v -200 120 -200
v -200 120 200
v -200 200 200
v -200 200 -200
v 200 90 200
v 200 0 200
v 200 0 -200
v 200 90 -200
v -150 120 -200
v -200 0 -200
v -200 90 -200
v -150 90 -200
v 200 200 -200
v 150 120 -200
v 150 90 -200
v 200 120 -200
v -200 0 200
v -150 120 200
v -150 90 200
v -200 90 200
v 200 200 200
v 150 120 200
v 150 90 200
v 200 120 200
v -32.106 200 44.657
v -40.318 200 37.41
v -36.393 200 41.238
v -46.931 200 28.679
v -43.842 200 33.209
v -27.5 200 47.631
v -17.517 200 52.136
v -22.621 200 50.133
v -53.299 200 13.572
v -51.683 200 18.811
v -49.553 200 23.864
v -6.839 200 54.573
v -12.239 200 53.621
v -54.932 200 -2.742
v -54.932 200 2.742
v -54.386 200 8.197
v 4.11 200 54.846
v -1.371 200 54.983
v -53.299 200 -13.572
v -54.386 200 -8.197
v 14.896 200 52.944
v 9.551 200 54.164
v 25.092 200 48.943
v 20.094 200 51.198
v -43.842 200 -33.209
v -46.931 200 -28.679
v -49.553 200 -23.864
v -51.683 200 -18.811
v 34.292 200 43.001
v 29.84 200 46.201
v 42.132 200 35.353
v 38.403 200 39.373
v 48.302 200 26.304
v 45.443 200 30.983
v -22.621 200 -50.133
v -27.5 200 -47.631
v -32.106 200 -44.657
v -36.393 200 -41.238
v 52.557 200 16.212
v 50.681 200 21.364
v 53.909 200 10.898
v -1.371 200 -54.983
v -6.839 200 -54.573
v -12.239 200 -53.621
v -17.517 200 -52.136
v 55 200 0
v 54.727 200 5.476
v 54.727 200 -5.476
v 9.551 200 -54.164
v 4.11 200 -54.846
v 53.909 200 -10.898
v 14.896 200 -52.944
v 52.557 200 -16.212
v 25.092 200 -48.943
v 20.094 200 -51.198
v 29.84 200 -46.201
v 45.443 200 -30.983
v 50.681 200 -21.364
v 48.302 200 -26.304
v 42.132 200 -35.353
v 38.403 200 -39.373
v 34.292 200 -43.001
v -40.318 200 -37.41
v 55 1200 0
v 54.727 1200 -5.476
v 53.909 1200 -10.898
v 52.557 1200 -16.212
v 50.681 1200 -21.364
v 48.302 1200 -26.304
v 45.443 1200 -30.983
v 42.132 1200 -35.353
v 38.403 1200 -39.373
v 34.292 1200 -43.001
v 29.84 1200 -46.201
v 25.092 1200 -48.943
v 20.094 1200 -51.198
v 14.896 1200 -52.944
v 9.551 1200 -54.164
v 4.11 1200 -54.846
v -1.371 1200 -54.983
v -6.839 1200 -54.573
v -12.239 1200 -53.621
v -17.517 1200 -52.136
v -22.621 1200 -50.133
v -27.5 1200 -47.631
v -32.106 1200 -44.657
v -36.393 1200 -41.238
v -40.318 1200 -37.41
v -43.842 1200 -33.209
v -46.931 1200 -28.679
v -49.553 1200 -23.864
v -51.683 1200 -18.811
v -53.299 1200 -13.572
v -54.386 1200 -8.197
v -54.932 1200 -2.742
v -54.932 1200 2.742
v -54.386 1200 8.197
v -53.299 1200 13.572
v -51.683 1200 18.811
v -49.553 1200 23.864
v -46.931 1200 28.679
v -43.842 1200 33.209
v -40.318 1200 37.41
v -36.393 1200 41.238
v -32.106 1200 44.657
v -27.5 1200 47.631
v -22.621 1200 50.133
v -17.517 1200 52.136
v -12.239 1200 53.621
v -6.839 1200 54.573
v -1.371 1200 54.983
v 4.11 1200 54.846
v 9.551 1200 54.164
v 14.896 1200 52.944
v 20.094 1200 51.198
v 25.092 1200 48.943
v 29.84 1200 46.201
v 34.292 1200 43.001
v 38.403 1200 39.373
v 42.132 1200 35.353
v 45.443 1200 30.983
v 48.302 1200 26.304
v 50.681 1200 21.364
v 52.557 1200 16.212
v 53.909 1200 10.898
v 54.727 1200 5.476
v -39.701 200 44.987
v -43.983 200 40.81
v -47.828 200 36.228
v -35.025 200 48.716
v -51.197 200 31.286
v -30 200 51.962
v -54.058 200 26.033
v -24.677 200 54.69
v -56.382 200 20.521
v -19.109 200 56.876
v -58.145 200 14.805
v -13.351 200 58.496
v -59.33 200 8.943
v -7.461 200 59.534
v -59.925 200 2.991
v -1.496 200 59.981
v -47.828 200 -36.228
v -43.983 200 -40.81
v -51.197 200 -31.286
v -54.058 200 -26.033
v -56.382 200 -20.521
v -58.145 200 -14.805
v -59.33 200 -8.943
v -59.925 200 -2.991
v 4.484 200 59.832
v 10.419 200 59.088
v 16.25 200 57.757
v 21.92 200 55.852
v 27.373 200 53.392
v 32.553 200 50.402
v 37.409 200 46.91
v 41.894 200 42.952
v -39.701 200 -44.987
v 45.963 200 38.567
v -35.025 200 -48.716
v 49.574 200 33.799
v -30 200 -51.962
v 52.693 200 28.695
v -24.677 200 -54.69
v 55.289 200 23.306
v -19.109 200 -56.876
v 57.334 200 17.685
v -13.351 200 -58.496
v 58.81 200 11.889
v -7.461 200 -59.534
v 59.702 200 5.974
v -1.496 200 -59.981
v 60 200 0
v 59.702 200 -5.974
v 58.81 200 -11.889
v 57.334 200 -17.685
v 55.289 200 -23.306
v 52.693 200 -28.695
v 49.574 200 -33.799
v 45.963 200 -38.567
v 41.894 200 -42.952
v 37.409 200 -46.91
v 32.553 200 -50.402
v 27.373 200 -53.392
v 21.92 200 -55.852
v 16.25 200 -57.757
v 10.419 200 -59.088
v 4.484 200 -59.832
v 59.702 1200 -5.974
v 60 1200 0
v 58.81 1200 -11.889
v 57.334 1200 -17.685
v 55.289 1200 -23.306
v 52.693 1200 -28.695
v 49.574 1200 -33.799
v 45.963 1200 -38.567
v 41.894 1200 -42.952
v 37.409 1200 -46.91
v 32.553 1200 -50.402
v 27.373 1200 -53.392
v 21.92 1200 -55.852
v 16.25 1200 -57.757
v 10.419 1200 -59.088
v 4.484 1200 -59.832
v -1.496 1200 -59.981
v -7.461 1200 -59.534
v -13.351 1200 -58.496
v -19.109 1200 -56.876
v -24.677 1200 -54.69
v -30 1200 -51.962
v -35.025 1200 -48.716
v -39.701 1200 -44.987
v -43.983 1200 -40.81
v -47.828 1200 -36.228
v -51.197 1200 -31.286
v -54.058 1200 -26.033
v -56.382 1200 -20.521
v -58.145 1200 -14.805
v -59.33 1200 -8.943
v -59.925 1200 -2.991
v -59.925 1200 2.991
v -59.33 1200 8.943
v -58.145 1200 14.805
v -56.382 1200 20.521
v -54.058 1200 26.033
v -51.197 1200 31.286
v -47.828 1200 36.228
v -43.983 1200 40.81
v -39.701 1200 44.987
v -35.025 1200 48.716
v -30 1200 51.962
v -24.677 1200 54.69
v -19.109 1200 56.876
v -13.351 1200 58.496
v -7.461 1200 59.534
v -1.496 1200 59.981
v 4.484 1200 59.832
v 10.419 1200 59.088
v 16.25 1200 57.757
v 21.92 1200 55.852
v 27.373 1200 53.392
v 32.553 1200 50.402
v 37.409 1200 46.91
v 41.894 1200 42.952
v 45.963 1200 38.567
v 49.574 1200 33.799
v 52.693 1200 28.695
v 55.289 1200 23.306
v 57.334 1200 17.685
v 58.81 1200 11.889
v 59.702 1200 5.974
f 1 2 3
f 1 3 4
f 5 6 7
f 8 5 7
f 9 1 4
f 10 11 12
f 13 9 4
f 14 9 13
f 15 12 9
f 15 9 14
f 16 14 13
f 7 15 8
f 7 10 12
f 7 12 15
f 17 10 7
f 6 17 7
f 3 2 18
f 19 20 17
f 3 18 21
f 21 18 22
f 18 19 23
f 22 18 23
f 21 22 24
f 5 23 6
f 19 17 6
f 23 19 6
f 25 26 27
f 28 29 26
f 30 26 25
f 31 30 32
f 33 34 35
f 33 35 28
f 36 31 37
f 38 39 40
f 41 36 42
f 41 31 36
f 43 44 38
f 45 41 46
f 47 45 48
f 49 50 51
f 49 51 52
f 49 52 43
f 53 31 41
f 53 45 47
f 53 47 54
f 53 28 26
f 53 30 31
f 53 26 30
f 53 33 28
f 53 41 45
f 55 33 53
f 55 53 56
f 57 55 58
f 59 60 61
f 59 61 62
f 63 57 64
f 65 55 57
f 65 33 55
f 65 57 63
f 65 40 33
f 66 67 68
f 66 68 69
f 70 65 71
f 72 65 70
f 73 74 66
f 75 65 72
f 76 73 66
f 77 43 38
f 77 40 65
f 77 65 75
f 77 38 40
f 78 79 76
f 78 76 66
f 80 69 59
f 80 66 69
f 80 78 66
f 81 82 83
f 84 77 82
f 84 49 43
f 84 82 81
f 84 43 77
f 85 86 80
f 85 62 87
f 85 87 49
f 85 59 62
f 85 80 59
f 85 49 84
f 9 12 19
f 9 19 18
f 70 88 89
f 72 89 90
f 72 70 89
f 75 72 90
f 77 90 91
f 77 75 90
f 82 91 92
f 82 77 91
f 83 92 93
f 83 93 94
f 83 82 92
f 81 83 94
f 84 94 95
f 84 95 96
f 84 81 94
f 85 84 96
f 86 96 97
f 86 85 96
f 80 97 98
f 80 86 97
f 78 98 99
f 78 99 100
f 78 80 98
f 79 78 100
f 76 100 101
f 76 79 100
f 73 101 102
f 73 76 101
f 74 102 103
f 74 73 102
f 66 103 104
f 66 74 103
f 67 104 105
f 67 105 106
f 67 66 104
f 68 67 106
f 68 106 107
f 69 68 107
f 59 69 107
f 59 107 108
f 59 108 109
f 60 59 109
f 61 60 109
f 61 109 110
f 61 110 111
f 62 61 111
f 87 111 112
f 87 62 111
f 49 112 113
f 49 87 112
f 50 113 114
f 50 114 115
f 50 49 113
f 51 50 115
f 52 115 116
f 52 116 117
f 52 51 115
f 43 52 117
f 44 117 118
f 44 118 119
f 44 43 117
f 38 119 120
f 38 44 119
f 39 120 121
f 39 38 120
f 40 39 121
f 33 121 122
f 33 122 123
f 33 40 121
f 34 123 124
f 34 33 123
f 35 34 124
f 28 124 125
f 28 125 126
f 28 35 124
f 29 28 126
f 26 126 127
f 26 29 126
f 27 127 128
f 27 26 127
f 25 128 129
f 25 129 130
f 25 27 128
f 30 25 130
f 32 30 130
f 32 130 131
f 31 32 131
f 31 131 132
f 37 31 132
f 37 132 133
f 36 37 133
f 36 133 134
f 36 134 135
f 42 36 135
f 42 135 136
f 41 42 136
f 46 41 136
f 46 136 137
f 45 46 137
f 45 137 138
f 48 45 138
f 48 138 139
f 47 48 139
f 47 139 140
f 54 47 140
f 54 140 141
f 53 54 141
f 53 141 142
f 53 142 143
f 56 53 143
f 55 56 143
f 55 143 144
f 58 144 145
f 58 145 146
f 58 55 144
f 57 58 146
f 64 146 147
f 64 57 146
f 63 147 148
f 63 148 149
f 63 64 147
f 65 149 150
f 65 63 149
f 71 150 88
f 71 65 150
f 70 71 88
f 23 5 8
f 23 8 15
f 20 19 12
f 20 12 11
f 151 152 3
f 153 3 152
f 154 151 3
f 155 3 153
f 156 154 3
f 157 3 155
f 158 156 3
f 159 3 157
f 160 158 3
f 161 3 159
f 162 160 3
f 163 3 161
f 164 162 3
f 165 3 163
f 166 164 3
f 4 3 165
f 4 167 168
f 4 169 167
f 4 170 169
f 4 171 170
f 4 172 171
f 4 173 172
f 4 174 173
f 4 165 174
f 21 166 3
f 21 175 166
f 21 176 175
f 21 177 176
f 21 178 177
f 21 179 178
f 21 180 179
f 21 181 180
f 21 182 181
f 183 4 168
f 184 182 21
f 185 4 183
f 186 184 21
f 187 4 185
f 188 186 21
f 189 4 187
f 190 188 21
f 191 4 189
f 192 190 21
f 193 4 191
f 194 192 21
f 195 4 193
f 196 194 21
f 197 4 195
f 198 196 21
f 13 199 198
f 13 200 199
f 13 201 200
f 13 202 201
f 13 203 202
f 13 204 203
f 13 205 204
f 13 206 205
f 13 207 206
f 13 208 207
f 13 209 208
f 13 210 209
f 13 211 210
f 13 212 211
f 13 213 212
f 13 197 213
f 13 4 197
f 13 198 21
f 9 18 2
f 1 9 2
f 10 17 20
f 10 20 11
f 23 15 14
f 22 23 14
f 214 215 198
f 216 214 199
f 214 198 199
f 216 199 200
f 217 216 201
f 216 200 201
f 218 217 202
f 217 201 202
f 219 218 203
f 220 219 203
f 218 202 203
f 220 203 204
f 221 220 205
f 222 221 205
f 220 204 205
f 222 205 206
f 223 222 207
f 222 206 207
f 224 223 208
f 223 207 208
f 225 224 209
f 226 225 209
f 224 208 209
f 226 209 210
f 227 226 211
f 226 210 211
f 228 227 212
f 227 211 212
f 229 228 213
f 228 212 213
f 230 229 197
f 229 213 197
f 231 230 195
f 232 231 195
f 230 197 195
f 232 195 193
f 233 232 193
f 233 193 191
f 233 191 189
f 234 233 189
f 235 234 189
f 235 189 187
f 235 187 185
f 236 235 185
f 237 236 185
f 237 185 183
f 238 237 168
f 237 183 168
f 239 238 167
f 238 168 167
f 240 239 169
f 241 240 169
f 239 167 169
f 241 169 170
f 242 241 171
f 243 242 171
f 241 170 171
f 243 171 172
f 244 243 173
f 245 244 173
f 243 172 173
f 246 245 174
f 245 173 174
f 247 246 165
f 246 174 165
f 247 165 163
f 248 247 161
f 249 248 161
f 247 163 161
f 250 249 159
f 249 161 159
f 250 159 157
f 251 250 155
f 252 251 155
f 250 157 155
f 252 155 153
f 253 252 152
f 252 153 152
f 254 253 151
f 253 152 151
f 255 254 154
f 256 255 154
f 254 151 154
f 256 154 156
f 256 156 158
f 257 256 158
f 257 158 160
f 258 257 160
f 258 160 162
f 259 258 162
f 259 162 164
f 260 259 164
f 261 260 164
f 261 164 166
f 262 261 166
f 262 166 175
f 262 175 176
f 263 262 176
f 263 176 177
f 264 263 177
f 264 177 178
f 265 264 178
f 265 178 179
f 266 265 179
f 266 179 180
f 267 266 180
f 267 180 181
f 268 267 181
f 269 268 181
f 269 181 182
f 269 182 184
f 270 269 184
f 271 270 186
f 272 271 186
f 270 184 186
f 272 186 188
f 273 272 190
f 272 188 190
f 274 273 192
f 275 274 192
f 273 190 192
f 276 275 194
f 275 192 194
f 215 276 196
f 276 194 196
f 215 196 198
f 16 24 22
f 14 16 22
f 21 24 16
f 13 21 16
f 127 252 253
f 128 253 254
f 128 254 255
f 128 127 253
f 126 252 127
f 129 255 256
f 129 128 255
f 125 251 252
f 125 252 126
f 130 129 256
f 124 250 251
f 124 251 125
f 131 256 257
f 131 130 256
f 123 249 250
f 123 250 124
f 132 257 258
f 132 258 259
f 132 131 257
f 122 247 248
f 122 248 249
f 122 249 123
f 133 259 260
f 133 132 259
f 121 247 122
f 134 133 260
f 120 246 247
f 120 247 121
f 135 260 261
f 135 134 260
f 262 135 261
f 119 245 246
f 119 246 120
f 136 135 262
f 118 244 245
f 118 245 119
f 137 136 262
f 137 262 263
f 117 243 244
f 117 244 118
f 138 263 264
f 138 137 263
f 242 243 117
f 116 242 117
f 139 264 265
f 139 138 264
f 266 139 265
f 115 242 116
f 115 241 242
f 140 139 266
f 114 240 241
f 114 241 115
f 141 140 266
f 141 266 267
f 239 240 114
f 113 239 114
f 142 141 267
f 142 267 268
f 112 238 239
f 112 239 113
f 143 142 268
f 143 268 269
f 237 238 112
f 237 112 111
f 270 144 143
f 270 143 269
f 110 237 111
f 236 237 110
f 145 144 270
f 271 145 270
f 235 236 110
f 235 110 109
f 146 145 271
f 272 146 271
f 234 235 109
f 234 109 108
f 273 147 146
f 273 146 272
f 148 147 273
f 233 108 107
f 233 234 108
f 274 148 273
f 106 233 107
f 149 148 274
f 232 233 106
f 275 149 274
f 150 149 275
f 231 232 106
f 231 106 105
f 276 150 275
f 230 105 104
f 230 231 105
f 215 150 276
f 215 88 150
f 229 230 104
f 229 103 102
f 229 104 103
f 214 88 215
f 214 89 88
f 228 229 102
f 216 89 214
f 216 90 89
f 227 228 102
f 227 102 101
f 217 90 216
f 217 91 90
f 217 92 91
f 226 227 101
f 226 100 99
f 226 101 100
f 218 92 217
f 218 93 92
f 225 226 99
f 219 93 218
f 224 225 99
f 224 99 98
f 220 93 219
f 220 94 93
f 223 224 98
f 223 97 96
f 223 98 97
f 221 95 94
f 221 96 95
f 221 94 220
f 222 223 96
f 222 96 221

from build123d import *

# Parameters (mm, degrees)
SKETCH1_W           = 400
SKETCH1_H           = 400
BOSS_EXTRUDE1_DEPTH = 200
SKETCH2_R           = 60
SKETCH2_R_2         = 55
BOSS_EXTRUDE2_DEPTH = 1000
SKETCH3_W           = 50
SKETCH3_H           = 30
CUT_EXTRUDE1_DEPTH  = 584


with BuildPart() as part:
    # Sketch1 → Boss-Extrude1 (new body)
    with BuildSketch(Plane(origin=(0, 0, 0), x_dir=(1, 0, 0), z_dir=(0, 1, 0))):
        Rectangle(SKETCH1_W, SKETCH1_H)
    extrude(amount=BOSS_EXTRUDE1_DEPTH)

    # Sketch2 → Boss-Extrude2 (add)
    with BuildSketch(Plane(origin=(0, 200, 0), x_dir=(1, 0, 0), z_dir=(0, 1, 0))):
        Circle(SKETCH2_R)
        Circle(SKETCH2_R_2, mode=Mode.SUBTRACT)
    extrude(amount=BOSS_EXTRUDE2_DEPTH)

    # Sketch3 → Cut-Extrude1 (cut)
    with BuildSketch(Plane(origin=(0, 0, -200), x_dir=(-1, 0, 0), z_dir=(0, 0, -1))):
        with Locations((-175, 105)):
            Rectangle(SKETCH3_W, SKETCH3_H)
        with Locations((175, 105)):
            Rectangle(SKETCH3_W, SKETCH3_H)
    extrude(amount=-CUT_EXTRUDE1_DEPTH, mode=Mode.SUBTRACT)


solid = part.part
